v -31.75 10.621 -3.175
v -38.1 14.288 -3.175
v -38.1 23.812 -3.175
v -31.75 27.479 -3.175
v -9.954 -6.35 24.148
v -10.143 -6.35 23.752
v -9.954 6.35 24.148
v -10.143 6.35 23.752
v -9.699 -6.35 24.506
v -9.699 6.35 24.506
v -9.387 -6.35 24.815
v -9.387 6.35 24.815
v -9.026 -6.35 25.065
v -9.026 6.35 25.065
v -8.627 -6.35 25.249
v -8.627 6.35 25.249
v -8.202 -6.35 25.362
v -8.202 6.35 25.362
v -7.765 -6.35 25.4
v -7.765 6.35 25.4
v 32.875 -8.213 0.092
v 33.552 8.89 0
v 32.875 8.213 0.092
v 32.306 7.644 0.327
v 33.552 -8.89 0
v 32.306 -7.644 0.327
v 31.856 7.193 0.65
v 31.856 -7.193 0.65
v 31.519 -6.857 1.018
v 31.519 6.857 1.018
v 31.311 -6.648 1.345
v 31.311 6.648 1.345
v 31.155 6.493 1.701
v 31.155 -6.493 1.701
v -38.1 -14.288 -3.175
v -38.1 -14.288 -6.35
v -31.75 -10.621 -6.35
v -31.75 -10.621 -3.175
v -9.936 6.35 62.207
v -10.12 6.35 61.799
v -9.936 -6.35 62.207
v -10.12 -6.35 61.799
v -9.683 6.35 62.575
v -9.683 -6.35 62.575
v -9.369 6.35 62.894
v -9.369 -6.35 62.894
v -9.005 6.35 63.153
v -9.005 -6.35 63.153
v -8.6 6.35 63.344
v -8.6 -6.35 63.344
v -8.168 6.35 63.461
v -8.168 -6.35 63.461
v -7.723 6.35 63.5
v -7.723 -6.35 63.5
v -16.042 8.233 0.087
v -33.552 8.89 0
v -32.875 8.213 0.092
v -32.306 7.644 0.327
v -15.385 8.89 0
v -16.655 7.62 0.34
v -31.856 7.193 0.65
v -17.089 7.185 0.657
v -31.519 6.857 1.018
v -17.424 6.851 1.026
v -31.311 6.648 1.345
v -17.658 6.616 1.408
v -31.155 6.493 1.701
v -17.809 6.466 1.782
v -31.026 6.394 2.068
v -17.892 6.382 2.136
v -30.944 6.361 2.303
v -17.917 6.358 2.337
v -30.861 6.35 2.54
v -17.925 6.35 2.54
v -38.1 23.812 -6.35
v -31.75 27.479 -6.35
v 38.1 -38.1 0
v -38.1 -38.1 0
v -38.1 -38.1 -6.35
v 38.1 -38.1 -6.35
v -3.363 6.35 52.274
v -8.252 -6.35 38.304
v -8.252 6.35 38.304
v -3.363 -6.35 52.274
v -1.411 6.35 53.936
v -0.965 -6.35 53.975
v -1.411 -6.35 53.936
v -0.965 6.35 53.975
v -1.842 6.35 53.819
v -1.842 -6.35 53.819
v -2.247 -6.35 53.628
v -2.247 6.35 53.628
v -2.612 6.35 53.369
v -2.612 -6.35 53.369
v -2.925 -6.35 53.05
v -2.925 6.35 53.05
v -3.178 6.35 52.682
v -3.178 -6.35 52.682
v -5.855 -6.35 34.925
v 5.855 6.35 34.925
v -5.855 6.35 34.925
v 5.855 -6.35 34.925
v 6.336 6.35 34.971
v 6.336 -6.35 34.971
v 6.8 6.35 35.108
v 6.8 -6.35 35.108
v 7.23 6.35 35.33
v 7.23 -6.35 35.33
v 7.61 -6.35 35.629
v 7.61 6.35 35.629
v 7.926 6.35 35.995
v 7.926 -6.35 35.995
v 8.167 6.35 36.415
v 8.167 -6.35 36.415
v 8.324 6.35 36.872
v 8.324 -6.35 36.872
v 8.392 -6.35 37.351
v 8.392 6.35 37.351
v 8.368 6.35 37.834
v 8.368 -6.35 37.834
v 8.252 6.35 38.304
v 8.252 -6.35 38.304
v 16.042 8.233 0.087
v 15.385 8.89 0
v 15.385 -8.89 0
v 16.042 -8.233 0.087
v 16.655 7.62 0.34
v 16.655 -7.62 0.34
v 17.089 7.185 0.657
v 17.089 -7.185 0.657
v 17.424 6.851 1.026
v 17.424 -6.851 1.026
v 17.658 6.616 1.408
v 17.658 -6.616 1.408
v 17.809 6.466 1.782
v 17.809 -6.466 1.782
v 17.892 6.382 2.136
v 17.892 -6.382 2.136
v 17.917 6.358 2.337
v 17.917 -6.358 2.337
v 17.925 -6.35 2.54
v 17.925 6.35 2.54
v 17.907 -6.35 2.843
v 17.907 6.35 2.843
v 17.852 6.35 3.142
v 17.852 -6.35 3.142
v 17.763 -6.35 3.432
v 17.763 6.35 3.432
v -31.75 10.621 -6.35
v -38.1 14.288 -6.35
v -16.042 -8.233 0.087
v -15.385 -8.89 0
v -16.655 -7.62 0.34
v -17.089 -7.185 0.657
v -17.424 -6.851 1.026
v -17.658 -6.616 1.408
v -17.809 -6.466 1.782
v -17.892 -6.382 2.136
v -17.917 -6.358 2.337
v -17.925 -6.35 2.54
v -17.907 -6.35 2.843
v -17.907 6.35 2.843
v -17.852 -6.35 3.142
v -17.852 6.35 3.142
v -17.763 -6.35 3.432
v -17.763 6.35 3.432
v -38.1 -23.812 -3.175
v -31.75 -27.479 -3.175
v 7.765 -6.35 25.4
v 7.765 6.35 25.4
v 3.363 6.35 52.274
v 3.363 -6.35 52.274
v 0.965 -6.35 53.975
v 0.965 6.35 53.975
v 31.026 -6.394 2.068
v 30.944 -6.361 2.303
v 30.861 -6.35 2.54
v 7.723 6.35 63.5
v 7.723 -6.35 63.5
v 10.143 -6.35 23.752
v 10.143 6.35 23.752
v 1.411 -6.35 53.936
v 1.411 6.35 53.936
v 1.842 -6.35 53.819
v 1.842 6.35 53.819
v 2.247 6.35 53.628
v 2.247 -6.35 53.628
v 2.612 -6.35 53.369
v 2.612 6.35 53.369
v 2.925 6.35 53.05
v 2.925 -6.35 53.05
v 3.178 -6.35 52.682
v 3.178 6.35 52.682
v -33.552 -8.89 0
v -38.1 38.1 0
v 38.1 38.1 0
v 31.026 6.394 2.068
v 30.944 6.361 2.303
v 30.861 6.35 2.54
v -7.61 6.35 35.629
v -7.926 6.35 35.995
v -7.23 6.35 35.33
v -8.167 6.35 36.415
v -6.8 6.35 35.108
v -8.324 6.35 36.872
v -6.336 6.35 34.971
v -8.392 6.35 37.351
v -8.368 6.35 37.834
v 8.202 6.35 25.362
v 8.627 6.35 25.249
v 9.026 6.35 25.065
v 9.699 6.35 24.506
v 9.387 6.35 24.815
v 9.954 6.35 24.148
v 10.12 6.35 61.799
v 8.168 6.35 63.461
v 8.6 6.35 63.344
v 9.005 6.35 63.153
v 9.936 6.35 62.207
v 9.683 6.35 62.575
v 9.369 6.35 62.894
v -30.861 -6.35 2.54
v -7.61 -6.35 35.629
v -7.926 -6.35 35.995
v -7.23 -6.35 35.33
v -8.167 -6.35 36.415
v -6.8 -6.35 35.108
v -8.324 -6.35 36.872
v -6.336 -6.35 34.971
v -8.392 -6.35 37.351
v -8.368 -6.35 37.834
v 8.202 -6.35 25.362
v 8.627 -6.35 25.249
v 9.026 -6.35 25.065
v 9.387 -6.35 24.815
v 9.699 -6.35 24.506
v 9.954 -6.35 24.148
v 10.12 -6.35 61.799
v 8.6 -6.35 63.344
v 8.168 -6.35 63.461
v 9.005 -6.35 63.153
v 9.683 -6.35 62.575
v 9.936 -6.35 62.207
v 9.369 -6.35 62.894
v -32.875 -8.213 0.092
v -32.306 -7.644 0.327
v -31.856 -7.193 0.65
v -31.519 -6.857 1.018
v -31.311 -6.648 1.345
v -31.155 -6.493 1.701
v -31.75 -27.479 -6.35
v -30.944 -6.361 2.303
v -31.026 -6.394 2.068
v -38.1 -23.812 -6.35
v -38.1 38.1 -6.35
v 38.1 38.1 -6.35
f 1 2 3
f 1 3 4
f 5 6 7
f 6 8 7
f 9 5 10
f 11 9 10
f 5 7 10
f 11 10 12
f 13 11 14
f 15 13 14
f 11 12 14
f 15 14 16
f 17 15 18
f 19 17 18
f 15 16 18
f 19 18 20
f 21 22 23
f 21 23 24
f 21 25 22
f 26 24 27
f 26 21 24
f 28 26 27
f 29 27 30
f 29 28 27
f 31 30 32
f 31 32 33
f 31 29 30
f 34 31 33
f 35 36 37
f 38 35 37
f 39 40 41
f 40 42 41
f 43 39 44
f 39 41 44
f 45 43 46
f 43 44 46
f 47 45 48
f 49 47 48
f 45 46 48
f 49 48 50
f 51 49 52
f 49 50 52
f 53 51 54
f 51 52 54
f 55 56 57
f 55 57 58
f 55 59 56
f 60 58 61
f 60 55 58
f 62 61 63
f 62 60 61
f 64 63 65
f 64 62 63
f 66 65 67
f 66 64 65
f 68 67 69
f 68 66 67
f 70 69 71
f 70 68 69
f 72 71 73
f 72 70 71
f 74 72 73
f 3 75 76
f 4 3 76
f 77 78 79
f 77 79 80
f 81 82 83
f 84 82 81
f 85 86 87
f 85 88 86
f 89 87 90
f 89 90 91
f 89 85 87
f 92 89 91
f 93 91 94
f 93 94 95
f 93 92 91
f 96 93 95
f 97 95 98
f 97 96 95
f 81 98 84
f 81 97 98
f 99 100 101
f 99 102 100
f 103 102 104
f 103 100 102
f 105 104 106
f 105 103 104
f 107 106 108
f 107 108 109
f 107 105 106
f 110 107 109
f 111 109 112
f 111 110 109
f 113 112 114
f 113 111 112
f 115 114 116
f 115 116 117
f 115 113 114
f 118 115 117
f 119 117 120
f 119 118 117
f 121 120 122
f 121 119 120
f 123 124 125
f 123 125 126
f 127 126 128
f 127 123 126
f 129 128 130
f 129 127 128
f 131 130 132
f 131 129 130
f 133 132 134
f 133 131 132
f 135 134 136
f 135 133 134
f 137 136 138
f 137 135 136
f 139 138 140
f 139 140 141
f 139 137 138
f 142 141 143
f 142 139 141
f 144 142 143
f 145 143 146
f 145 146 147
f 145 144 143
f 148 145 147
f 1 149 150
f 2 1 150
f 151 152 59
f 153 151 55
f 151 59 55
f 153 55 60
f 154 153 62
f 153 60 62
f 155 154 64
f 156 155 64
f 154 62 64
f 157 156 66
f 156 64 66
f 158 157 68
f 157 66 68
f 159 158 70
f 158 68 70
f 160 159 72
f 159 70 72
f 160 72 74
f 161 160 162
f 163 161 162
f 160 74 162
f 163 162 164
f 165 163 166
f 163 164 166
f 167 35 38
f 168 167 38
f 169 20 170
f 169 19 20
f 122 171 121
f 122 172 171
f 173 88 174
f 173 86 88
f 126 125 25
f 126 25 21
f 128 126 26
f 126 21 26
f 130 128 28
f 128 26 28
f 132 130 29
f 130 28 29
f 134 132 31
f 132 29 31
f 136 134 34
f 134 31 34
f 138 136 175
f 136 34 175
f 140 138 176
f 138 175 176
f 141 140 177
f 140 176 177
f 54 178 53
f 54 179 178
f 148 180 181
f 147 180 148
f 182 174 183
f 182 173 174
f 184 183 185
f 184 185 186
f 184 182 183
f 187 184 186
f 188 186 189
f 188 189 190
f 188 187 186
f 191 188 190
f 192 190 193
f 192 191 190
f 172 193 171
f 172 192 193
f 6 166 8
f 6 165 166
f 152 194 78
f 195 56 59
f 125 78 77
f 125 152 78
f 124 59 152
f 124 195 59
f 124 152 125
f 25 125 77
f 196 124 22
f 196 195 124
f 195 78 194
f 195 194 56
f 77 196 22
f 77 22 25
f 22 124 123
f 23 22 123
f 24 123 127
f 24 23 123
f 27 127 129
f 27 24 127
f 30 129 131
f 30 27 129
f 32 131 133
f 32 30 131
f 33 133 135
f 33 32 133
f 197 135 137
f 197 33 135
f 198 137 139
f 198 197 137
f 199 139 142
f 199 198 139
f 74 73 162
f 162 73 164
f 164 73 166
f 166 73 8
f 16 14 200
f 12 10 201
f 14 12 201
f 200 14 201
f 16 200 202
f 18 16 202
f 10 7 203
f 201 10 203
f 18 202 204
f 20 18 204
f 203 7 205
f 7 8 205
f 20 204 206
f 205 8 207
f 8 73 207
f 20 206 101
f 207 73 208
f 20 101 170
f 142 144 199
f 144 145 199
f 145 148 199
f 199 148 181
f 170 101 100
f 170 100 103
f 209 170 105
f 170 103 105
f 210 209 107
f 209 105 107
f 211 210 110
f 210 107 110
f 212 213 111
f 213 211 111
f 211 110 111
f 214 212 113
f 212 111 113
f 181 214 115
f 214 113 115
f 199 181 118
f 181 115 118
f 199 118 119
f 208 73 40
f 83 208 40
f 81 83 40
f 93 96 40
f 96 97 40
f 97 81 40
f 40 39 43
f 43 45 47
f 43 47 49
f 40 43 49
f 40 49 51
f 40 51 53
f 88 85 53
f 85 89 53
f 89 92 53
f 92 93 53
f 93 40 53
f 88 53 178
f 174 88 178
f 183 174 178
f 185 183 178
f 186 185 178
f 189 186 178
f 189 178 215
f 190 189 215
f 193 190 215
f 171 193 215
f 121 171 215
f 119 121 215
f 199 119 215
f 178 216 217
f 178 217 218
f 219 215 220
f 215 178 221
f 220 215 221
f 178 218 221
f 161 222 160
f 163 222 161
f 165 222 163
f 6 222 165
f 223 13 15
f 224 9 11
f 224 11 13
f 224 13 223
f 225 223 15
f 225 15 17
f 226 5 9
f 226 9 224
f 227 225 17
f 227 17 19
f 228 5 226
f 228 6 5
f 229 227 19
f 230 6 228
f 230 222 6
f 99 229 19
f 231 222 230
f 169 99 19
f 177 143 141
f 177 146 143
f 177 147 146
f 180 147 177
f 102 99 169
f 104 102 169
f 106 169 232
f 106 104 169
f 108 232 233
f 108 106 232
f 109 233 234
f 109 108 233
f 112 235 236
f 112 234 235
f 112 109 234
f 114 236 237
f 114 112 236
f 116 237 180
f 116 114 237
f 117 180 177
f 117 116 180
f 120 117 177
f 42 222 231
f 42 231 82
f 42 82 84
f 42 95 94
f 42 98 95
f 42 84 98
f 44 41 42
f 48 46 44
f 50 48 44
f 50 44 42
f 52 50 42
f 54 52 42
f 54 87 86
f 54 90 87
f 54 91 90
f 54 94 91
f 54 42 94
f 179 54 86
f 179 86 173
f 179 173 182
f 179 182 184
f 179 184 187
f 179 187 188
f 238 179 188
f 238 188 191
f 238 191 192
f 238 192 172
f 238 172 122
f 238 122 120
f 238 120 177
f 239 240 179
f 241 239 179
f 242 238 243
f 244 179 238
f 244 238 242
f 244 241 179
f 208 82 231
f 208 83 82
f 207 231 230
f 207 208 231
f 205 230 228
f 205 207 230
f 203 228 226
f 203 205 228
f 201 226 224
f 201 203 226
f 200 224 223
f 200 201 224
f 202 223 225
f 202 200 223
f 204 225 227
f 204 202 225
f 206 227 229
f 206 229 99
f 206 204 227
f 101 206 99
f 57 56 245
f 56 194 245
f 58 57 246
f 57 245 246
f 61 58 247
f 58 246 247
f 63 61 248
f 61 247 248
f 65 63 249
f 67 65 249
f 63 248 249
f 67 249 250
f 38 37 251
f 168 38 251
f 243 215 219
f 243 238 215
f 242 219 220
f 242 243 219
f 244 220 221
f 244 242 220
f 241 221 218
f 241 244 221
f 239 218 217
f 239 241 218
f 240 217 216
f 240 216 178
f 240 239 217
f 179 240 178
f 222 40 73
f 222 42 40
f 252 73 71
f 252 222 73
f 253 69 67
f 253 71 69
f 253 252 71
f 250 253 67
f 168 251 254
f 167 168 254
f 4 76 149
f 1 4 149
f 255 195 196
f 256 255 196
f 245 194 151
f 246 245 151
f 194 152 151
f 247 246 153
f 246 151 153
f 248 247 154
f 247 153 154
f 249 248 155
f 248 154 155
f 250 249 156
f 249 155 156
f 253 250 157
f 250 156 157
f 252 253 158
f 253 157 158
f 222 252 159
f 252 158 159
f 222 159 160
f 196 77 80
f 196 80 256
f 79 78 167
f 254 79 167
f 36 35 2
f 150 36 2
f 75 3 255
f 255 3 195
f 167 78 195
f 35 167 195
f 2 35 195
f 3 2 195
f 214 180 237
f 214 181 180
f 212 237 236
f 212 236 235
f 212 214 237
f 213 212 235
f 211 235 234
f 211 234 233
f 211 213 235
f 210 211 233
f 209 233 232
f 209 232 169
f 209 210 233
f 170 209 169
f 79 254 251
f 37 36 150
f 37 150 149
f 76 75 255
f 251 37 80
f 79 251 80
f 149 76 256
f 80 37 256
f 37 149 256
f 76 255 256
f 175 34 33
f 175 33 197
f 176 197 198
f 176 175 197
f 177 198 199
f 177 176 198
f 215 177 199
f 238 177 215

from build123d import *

# Parameters (mm, degrees)
F0_W     = 76.2
F0_H     = 76.2
F2_DEPTH = 6.35
F3_DEPTH = 6.35
F4_R     = 2.54
F6_DEPTH = 3.175


with BuildPart() as f2:
    # F0 (on Top) → F2 (new body)
    with BuildSketch(Plane.XY):
        Rectangle(F0_W, F0_H)
    extrude(amount=-F2_DEPTH)

    # F1 (on Front) → F3 (join, symmetric)
    with BuildSketch(Plane.XZ):
        Polygon((19.05, 0), (31.75, 0), (9.525, 63.5), (-9.525, 63.5), (-31.75, 0), (-19.05, 0), (-9.525, 25.4), (9.525, 25.4), align=None)
        Polygon((2.767193, 53.975), (9.434693, 34.925), (-9.434693, 34.925), (-2.767193, 53.975), align=None, mode=Mode.SUBTRACT)
    extrude(amount=F3_DEPTH, both=True)

    # F4
    f4_edges = [f2.edges().sort_by_distance(p)[0] for p in [
        (25.4, 6.35, 0),
        (19.05, 0, 0),
        (31.75, 0, 0),
        (25.4, -6.35, 0),
        (-25.4, -6.35, 0),
        (-19.05, 0, 0),
        (-25.4, 6.35, 0),
        (-31.75, 0, 0),
        (9.434693, 0, 34.925),
        (-9.434693, 0, 34.925),
        (2.767193, 0, 53.975),
        (-2.767193, 0, 53.975),
        (9.525, 0, 63.5),
        (-9.525, 0, 63.5),
        (9.525, 0, 25.4),
        (-9.525, 0, 25.4),
    ]]
    fillet(f4_edges, radius=F4_R)

    # F5 (on face) → F6 (cut)
    with BuildSketch(Plane(origin=(0, 0, -6.35), x_dir=(1, 0, 0), z_dir=(0, 0, -1))):
        Polygon((-38.1, -14.2875), (-38.1, -23.8125), (-31.75, -27.478674), (-31.75, -10.621326), align=None)
        Polygon((-31.75, 27.478674), (-38.1, 23.8125), (-38.1, 14.2875), (-31.75, 10.621326), align=None)
    extrude(amount=-F6_DEPTH, mode=Mode.SUBTRACT)


solid = f2.part
